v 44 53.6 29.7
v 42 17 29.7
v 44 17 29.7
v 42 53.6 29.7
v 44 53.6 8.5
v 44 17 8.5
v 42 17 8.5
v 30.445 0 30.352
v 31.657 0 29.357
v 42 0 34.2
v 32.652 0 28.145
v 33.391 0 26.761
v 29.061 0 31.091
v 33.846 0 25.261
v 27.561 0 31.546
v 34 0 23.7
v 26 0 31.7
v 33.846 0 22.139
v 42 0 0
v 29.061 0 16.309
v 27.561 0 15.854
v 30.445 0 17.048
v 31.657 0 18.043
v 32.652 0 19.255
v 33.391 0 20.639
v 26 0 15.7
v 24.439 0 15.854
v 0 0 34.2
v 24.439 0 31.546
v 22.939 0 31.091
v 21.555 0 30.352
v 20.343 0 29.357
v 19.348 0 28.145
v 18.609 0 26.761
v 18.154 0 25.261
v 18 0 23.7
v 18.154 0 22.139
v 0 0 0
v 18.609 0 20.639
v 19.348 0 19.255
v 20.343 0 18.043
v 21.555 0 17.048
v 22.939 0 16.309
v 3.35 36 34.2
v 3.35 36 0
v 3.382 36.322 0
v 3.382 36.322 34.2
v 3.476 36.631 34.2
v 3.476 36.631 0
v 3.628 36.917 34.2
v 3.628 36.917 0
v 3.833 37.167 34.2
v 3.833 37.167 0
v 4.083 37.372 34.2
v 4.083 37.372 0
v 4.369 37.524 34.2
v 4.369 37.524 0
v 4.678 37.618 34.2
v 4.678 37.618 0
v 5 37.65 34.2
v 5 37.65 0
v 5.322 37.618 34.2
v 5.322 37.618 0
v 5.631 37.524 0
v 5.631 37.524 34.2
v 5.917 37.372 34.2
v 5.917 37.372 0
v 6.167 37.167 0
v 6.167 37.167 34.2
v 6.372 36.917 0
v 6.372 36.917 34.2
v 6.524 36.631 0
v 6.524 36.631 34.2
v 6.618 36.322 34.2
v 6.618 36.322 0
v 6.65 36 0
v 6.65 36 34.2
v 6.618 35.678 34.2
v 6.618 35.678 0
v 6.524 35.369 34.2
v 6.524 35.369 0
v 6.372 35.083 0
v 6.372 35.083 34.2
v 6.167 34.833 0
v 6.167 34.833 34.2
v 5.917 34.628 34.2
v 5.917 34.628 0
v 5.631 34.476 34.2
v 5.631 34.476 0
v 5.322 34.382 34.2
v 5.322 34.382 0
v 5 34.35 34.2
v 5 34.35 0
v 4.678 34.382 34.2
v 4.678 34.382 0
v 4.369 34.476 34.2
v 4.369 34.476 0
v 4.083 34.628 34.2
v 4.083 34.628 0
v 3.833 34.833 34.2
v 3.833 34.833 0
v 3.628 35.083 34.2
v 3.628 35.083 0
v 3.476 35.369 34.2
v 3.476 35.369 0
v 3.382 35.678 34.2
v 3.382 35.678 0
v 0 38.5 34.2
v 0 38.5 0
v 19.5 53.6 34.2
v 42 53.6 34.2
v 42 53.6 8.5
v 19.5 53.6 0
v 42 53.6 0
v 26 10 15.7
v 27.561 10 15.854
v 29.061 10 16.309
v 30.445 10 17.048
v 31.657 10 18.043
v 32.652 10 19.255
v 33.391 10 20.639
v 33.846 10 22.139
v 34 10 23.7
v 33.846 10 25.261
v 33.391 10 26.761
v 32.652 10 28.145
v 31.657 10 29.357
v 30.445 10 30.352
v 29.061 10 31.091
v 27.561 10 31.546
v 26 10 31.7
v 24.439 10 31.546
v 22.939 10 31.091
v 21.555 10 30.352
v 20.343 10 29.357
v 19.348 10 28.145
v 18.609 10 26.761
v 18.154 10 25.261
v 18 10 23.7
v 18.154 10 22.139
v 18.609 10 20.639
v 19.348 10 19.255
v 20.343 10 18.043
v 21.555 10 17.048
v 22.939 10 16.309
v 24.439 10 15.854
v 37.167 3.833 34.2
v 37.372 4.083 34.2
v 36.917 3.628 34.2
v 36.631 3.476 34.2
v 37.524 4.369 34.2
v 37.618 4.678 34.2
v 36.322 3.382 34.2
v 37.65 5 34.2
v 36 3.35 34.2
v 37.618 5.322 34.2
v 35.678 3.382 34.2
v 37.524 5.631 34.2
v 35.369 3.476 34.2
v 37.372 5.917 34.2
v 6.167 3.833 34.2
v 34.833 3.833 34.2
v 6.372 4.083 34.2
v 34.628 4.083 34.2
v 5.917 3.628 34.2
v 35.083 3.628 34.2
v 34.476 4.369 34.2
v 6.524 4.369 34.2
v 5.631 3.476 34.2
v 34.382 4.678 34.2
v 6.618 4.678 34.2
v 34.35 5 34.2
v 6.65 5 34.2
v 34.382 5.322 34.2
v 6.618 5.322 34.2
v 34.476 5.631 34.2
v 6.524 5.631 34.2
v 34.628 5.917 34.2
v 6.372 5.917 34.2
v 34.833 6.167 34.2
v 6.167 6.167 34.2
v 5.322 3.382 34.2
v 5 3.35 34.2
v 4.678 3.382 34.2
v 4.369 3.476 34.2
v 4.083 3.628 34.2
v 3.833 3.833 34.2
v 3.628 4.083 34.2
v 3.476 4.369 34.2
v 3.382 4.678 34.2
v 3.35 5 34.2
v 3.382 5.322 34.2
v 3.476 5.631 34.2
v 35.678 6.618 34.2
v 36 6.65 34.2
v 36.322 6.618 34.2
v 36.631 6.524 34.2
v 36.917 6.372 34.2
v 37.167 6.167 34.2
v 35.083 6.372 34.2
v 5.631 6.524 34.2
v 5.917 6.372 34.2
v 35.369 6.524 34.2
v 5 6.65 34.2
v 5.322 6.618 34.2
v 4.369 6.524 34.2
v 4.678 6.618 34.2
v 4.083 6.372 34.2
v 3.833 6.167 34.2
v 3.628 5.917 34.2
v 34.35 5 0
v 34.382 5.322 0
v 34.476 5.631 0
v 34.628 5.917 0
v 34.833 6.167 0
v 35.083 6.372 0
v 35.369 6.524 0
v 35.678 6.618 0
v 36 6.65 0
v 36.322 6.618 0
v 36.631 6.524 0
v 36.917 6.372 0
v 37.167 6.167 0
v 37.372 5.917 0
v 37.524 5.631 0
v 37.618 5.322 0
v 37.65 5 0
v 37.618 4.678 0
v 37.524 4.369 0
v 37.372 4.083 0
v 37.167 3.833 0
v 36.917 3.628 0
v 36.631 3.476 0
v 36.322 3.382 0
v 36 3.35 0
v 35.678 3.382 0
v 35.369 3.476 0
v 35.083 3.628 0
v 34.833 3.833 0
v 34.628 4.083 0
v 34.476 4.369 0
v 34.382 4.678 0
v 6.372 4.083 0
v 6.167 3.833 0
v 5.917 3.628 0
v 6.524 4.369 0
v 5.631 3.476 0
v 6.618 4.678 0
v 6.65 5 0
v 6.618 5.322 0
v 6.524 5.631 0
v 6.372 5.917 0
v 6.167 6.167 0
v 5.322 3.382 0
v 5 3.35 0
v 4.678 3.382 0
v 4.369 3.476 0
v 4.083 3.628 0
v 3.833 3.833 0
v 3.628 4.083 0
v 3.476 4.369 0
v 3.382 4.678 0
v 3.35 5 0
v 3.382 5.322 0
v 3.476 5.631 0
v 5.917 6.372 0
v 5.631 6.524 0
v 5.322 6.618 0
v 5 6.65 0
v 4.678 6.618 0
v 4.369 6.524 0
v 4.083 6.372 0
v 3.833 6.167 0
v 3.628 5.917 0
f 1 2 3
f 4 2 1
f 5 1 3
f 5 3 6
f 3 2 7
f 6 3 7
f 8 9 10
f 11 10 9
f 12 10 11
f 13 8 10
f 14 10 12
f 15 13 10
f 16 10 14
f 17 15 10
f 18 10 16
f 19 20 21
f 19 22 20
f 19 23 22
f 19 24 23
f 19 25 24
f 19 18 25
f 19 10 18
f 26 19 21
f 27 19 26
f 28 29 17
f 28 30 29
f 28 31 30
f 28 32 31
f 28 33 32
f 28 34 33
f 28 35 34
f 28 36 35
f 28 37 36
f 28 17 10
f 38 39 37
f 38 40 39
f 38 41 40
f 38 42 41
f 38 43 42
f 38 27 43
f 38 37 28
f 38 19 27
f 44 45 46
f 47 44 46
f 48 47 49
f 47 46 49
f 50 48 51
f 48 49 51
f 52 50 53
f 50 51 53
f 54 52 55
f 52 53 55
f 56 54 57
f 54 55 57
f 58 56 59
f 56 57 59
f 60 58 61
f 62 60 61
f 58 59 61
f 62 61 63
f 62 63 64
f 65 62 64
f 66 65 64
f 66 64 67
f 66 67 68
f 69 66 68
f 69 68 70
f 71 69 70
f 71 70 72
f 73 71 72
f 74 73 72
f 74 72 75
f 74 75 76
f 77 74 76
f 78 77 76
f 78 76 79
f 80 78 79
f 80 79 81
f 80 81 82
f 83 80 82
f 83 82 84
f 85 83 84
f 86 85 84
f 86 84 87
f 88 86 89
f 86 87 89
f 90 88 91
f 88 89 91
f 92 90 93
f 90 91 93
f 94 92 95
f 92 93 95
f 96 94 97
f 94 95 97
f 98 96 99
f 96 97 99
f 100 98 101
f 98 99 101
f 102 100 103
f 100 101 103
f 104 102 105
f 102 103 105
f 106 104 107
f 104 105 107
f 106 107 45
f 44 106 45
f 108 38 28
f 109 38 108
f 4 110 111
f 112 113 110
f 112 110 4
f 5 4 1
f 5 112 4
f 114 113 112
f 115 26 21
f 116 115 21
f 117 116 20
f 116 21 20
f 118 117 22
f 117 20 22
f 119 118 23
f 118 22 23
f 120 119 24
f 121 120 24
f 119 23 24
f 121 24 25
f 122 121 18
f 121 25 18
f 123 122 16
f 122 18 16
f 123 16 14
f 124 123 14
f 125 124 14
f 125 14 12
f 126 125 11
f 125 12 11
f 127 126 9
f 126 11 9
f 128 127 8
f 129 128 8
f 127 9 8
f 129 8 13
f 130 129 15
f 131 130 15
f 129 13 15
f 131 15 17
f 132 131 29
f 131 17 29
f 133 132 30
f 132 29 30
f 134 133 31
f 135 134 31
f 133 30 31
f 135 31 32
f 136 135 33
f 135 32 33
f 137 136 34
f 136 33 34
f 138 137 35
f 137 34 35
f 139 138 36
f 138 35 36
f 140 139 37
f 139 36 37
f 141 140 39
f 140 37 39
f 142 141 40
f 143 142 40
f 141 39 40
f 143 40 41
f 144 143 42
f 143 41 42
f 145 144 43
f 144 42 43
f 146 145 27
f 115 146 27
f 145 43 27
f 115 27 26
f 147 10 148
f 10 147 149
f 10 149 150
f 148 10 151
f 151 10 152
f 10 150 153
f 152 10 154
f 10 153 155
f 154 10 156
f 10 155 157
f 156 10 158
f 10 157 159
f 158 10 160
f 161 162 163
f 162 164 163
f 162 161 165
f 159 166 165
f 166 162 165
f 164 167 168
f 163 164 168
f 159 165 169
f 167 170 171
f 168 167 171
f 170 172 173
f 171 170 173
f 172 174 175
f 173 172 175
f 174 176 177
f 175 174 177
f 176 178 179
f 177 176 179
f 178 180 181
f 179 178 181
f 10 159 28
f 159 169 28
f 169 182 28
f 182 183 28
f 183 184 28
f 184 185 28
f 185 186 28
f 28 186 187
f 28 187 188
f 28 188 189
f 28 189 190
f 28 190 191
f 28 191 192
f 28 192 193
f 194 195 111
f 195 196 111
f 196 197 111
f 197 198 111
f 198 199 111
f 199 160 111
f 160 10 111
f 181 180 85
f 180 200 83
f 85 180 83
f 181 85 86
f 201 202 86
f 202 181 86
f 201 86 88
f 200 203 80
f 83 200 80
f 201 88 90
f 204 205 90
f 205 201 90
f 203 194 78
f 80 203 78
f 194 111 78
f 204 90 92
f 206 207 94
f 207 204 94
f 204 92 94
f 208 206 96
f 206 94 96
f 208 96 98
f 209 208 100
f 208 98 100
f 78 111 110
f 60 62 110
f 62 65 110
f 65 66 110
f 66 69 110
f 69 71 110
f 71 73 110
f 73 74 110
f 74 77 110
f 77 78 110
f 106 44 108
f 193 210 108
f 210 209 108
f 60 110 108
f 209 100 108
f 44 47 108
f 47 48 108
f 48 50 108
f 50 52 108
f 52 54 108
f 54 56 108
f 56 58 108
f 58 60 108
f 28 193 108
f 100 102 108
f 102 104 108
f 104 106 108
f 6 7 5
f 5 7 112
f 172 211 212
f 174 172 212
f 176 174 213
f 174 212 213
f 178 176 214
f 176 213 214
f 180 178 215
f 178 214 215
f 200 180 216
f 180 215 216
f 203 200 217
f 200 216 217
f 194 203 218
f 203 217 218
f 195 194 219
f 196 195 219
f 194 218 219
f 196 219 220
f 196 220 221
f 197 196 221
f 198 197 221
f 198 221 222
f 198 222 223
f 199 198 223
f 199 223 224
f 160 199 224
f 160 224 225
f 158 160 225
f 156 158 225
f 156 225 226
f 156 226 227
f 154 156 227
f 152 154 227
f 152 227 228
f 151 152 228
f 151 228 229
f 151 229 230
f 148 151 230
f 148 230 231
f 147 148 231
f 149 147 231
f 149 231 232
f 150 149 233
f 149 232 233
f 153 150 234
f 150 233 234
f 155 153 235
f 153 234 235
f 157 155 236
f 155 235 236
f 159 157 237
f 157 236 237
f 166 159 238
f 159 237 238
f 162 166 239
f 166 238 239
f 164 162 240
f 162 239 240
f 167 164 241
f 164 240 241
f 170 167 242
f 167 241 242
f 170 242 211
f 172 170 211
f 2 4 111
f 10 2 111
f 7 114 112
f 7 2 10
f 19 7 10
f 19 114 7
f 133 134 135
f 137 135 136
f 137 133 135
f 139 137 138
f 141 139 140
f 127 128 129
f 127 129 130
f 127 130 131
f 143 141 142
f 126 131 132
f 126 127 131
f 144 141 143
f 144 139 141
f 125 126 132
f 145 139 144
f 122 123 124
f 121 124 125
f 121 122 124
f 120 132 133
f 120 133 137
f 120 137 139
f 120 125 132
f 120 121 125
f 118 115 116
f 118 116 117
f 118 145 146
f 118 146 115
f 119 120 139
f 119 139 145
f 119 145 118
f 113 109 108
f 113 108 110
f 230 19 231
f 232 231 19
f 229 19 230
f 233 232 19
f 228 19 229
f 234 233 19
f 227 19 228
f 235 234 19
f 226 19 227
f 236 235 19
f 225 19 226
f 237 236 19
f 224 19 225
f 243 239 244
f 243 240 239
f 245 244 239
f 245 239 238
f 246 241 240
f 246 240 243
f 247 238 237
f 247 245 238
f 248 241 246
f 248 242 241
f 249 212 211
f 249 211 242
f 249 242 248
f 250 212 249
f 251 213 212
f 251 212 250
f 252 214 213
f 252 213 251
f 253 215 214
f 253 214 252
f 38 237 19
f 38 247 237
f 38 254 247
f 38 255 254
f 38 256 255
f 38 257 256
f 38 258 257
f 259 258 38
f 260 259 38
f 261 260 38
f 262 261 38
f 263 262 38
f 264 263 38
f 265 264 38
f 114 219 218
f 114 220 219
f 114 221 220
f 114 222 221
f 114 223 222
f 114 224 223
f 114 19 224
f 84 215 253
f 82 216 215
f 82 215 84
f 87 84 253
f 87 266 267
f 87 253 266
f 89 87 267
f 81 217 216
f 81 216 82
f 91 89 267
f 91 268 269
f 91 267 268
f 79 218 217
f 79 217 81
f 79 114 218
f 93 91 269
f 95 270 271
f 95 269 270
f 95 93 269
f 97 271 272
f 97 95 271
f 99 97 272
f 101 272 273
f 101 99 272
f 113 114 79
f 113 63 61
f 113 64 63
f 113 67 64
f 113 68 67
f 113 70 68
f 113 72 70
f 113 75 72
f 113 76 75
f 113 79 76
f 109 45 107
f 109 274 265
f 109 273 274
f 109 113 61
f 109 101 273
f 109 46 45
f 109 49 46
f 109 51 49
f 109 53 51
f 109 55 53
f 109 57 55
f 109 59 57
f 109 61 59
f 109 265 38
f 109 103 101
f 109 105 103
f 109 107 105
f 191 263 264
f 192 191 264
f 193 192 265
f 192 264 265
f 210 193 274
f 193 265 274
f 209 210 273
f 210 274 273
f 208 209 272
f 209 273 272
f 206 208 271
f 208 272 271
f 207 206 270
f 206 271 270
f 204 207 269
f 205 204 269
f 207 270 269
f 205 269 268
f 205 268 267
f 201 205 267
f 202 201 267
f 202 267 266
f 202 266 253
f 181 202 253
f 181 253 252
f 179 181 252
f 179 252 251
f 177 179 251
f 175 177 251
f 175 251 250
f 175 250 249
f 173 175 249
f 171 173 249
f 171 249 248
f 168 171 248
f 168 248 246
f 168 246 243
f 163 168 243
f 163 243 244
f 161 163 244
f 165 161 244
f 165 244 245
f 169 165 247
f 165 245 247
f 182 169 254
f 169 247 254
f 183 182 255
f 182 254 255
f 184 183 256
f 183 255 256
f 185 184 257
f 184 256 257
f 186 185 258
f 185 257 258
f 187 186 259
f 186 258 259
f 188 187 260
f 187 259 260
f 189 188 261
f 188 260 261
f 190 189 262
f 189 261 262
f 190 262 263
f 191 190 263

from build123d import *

# Parameters (mm, degrees)
BOSS_EXTRUDE1_DEPTH = 34.2
SKETCH2_R           = 8
CUT_EXTRUDE1_DEPTH  = 10
SKETCH3_W           = 21.2
SKETCH3_H           = 36.6
BOSS_EXTRUDE2_DEPTH = 2
SKETCH5_R           = 1.65
CUT_EXTRUDE4_DEPTH  = 78.321407126


with BuildPart() as part:
    # Sketch1 → Boss-Extrude1 (new body)
    with BuildSketch(Plane.XY):
        Polygon((0, 38.5), (19.5, 53.6), (42, 53.6), (42, 0), (0, 0), align=None)
    extrude(amount=BOSS_EXTRUDE1_DEPTH)

    # Sketch2 → Cut-Extrude1 (cut)
    with BuildSketch(Plane.XZ):
        with Locations(Location((26, 23.7, 0), (0, 0, 270))):
            Circle(SKETCH2_R)
    extrude(amount=-CUT_EXTRUDE1_DEPTH, mode=Mode.SUBTRACT)

    # Sketch3 → Boss-Extrude2 (add)
    with BuildSketch(Plane(origin=(42, 0, 0), x_dir=(0, 0, -1), z_dir=(1, 0, 0))):
        with Locations((-19.1, 35.3)):
            Rectangle(SKETCH3_W, SKETCH3_H)
    extrude(amount=BOSS_EXTRUDE2_DEPTH)

    # Sketch5 → Cut-Extrude4 (cut, through all)
    with BuildSketch(Plane(origin=(0, 0, 0), x_dir=(-1, 0, 0), z_dir=(0, 0, -1))):
        with Locations((-36, 5)):
            Circle(SKETCH5_R)
        with Locations((-5, 5)):
            Circle(SKETCH5_R)
        with Locations((-5, 36)):
            Circle(SKETCH5_R)
    extrude(amount=-CUT_EXTRUDE4_DEPTH, mode=Mode.SUBTRACT)


solid = part.part
